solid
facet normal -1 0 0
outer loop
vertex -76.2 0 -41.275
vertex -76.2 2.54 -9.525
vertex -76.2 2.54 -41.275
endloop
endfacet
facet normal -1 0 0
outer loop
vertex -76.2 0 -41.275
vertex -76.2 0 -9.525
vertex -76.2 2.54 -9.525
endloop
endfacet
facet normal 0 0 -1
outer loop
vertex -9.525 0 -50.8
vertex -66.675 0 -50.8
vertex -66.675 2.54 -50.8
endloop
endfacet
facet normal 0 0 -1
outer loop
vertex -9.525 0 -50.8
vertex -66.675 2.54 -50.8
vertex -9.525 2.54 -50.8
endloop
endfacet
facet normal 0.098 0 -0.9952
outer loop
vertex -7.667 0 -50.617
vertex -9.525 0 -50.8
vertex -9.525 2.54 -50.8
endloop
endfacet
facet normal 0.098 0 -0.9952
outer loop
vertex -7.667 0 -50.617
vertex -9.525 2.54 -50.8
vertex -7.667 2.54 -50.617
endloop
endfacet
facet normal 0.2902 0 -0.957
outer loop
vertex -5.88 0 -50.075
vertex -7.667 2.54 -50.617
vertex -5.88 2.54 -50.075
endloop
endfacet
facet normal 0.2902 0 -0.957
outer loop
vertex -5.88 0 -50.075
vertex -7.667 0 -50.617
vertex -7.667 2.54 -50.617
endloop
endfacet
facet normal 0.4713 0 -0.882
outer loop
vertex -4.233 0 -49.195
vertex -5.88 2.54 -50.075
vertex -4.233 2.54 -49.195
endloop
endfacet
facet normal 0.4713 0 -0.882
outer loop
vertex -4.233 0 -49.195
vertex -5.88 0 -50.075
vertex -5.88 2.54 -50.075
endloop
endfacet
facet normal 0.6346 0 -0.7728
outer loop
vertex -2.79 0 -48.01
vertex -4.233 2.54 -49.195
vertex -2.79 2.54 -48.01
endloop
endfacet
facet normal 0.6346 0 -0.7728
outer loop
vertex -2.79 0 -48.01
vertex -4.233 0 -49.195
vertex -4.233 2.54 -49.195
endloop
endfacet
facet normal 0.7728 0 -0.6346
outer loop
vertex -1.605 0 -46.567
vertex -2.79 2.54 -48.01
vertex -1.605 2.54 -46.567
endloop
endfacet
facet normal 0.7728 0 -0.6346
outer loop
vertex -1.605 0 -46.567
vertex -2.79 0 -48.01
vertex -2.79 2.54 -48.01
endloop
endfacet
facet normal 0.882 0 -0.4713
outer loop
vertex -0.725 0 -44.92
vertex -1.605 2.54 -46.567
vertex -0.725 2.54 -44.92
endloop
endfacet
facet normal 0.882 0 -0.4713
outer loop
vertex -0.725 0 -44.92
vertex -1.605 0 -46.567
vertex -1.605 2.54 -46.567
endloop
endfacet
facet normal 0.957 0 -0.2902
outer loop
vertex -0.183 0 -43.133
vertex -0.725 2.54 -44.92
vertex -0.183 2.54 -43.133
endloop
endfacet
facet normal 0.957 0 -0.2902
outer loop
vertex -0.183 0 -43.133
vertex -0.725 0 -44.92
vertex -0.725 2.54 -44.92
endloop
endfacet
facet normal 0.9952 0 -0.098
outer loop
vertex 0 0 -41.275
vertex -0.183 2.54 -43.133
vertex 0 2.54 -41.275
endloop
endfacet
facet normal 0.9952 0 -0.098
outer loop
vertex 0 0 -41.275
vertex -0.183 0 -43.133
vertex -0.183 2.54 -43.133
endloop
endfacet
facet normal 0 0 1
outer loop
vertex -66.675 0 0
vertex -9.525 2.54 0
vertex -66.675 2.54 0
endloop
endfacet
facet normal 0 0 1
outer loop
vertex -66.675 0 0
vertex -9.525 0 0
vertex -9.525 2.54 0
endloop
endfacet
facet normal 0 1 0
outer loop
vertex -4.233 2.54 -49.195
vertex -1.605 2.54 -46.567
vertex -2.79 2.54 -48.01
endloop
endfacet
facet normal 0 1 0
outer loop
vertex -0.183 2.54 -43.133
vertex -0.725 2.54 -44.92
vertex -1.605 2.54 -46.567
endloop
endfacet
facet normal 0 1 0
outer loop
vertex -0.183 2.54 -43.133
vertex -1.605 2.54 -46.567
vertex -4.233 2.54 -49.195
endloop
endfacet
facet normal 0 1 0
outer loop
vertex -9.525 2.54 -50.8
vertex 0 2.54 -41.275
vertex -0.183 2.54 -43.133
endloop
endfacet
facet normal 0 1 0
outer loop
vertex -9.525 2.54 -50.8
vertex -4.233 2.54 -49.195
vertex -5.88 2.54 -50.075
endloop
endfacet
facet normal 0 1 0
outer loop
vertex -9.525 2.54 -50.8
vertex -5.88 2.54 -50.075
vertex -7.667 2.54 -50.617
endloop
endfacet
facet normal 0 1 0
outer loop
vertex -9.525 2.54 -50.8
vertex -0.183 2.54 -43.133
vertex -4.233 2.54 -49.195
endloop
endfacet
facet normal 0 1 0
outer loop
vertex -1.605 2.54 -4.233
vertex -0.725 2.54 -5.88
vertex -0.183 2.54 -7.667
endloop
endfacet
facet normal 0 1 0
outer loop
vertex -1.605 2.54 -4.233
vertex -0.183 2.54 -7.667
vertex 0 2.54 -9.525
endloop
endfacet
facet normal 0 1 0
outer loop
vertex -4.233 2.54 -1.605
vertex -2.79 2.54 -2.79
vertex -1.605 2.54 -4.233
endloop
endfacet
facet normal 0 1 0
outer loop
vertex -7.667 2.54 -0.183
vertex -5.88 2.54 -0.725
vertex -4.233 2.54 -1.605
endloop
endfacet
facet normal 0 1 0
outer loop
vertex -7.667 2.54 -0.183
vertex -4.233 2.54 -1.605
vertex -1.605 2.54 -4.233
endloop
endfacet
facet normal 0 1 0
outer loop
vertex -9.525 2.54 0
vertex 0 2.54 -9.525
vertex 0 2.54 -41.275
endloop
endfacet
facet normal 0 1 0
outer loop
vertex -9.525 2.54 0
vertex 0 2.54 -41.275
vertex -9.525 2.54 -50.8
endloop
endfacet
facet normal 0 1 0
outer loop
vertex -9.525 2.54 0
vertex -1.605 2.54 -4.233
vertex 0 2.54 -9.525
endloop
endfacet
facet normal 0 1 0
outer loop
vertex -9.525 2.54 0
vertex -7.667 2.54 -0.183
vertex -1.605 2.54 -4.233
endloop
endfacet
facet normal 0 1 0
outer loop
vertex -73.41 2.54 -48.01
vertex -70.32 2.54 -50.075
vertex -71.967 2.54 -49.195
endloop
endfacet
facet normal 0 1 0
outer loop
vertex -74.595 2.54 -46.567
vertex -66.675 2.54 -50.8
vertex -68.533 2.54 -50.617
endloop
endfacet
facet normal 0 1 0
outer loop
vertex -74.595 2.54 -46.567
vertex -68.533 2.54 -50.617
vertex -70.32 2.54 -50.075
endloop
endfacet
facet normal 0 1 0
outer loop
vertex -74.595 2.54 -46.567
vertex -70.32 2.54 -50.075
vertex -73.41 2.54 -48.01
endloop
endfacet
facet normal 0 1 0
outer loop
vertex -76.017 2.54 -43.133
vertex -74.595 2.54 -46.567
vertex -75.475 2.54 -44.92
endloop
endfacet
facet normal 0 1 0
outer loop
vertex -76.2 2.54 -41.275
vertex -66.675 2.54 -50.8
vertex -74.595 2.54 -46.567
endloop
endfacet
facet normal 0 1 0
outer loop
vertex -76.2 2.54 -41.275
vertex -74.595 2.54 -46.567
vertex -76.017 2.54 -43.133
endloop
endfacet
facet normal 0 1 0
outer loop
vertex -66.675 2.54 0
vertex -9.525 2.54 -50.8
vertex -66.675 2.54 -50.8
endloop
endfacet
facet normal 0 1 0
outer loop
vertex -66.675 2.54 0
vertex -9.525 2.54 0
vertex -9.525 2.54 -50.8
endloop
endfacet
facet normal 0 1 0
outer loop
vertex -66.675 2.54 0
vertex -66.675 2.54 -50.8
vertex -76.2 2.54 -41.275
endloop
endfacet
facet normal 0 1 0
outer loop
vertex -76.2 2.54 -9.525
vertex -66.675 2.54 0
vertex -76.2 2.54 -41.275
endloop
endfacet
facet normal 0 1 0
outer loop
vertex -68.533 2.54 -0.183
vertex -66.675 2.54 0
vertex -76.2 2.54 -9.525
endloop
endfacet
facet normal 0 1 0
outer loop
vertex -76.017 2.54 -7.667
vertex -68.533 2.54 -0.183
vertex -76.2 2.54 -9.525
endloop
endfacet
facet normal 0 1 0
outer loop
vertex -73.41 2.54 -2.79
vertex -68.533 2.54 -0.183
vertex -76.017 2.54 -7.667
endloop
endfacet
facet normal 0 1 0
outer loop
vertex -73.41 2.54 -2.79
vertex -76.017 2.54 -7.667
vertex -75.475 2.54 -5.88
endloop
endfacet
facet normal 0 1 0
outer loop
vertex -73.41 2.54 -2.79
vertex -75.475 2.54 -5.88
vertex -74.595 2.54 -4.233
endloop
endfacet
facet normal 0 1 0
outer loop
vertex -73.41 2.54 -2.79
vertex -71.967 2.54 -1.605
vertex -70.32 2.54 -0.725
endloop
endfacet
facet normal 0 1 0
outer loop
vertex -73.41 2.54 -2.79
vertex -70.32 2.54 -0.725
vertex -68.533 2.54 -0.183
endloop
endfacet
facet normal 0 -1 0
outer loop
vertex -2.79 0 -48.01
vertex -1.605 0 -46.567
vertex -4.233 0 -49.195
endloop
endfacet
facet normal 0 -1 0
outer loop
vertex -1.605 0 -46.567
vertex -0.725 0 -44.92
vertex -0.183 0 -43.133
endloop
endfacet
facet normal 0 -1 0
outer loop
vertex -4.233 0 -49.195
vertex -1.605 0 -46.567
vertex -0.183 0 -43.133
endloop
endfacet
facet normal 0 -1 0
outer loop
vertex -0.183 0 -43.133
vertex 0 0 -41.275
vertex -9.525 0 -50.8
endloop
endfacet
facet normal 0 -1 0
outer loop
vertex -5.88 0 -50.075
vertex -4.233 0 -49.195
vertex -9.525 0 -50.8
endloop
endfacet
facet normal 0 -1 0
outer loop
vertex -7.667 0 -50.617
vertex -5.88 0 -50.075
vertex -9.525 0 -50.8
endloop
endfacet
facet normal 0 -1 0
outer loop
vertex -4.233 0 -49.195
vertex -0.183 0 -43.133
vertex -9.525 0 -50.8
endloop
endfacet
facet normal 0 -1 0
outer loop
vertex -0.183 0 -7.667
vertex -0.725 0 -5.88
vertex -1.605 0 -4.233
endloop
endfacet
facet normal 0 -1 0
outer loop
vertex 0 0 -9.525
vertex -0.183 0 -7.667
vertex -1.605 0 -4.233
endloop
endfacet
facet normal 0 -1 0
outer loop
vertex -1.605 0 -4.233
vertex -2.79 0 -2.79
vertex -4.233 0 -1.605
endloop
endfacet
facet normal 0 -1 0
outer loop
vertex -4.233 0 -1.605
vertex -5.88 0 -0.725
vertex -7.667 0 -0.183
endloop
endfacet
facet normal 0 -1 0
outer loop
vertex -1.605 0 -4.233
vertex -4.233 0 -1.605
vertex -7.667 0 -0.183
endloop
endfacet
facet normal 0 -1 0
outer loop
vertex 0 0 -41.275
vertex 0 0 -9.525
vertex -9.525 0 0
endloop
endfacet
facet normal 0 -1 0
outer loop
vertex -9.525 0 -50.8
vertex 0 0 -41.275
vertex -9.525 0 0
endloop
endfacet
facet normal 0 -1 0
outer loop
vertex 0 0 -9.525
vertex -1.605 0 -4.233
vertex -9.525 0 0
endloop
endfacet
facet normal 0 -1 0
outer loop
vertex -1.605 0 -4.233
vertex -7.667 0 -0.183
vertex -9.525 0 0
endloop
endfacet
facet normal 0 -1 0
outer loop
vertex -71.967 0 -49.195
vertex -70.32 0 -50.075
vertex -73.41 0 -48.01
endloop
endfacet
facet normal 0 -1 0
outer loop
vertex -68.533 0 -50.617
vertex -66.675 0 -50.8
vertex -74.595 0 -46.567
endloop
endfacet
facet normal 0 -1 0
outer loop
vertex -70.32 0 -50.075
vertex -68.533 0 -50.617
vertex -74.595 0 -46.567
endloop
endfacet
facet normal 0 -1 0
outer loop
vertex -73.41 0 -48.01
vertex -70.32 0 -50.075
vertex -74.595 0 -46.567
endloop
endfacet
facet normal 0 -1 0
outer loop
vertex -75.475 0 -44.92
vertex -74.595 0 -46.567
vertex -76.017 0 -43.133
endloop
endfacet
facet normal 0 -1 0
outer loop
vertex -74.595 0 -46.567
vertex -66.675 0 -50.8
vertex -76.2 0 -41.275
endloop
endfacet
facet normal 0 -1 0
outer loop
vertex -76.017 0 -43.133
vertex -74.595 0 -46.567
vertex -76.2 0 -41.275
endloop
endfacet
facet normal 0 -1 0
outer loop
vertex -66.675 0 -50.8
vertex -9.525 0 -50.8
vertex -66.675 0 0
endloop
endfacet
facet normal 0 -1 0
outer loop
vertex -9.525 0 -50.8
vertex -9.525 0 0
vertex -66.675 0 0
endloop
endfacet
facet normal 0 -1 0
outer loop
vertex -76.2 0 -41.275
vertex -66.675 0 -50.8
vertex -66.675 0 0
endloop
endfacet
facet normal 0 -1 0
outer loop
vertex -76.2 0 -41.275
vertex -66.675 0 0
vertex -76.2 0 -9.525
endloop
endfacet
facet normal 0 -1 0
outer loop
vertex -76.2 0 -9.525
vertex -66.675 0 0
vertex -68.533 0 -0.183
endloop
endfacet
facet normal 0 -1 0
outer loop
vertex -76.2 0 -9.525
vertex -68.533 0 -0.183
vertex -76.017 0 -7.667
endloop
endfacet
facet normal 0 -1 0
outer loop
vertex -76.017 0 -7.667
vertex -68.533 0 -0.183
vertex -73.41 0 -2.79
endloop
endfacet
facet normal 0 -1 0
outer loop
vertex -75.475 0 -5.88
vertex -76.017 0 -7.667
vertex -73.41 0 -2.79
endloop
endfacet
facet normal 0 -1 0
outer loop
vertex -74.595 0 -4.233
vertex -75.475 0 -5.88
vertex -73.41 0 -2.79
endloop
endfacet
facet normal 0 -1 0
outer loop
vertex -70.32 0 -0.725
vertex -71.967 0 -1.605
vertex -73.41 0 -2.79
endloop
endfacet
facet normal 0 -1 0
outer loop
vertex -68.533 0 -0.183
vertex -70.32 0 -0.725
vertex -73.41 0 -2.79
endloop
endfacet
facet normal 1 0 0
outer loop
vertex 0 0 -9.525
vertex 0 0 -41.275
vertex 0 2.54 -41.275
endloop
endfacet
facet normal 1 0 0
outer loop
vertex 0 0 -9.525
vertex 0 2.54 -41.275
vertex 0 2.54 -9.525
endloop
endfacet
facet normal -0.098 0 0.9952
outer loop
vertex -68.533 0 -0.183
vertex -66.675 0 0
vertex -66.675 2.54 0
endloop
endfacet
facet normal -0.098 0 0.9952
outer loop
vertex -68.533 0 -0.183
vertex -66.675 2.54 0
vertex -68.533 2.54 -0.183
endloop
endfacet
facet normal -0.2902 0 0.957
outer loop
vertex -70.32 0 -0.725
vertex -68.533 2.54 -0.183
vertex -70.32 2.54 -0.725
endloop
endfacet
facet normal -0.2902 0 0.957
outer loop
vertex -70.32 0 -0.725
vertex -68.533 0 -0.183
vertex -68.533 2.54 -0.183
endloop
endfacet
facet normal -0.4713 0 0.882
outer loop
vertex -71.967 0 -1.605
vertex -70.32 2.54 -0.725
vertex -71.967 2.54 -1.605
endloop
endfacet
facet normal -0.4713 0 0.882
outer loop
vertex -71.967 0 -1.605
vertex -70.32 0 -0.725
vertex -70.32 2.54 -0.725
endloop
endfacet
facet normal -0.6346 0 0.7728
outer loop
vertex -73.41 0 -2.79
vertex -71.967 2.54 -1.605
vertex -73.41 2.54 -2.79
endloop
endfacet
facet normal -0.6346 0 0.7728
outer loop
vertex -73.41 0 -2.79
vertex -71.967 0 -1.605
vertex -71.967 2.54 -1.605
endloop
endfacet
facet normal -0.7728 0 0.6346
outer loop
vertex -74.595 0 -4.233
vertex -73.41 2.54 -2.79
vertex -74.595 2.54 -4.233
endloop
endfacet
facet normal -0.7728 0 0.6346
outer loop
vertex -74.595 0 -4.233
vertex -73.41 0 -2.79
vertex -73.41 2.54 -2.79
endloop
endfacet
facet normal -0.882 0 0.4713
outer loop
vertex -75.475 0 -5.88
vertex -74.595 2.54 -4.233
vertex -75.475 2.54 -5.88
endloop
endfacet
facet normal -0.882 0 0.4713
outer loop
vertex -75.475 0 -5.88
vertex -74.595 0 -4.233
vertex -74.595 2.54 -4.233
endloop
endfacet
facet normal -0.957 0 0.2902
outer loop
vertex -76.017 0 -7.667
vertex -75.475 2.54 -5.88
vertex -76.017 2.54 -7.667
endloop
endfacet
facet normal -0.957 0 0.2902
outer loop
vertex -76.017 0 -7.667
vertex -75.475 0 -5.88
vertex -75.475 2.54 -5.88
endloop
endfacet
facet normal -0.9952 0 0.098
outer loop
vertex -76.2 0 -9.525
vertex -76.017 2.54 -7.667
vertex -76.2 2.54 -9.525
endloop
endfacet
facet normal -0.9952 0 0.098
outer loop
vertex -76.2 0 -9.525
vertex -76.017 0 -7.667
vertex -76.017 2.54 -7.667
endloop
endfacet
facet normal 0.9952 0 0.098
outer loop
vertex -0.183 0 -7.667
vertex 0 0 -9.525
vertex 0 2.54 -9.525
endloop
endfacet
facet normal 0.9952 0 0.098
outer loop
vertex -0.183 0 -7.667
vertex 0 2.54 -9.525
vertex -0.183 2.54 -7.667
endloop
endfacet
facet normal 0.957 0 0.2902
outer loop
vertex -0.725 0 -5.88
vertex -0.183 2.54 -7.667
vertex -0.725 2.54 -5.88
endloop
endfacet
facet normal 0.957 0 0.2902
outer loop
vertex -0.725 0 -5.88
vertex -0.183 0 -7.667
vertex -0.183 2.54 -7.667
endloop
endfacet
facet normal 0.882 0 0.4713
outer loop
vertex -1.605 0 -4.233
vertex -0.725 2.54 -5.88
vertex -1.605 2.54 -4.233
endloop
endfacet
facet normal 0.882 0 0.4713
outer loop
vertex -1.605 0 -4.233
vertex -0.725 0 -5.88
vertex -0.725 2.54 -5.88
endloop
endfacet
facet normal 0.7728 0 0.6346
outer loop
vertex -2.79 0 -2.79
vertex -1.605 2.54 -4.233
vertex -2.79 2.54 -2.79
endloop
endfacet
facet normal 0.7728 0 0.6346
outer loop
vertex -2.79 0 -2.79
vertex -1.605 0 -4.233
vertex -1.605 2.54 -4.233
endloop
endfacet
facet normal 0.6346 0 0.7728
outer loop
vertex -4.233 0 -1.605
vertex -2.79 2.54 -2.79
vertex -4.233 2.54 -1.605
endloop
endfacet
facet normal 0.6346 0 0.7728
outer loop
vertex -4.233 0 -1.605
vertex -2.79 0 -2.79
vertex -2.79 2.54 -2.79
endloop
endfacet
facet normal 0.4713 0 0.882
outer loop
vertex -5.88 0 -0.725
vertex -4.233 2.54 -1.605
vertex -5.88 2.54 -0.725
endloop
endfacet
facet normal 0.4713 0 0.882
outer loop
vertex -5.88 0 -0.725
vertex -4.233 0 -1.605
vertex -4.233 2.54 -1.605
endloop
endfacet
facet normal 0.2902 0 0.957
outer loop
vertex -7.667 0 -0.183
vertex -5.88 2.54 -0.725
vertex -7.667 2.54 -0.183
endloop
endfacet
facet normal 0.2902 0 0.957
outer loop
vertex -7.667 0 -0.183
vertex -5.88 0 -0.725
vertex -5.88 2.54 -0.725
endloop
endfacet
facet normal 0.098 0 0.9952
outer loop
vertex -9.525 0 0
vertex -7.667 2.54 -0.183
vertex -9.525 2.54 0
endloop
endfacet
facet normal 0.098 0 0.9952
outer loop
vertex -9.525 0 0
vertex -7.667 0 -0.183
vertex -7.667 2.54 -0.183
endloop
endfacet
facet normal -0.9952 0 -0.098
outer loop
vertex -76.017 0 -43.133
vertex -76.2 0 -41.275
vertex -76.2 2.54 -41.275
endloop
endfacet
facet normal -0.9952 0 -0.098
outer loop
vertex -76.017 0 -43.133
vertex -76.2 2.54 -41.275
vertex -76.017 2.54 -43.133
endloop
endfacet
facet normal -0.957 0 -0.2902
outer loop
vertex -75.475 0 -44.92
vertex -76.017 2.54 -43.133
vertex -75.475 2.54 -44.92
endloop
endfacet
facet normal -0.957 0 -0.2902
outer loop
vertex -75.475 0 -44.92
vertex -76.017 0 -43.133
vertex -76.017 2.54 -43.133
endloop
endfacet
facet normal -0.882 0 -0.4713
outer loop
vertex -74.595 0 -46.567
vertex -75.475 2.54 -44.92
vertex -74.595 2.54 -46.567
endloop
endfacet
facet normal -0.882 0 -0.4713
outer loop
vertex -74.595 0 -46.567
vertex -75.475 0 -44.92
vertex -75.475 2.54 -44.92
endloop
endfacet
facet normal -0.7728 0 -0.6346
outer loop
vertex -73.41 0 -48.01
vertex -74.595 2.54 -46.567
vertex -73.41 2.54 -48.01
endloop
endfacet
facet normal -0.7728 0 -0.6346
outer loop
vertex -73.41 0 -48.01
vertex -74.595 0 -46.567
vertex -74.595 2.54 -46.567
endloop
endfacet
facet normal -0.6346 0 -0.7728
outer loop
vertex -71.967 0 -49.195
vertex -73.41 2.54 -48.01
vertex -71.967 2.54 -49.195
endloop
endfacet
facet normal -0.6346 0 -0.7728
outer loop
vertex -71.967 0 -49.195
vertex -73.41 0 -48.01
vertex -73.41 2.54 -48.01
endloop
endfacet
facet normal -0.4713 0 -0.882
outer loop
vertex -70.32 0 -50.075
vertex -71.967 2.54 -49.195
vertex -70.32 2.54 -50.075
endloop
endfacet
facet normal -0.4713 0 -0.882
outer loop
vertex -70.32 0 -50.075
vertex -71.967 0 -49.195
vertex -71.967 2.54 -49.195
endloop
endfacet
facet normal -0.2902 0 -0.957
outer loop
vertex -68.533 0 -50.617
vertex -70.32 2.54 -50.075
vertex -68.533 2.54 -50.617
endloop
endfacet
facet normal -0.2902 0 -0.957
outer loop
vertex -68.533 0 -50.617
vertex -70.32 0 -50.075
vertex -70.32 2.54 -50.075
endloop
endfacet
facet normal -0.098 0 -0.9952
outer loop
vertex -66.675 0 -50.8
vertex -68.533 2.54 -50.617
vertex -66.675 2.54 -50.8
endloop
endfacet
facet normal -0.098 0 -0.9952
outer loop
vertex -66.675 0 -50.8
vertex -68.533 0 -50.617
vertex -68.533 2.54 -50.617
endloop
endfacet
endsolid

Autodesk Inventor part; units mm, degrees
ref_plane "YZ Plane" through (0, 0, 0) normal (1, 0, 0) x (0, 1, 0)
ref_plane "XZ Plane" through (0, 0, 0) normal (0, 1, 0) x (-1, 0, 0)
ref_plane "XY Plane" through (0, 0, 0) normal (0, 0, 1) x (1, 0, 0)
sketch "Sketch1" plane through (0, 0, 0) normal (0, 1, 0) x (-1, 0, 0)
  line L0 (9.525, 0) -> (66.675, 0)
  line L1 (76.2, -9.525) -> (76.2, -41.275)
  line L2 (66.675, -50.8) -> (9.525, -50.8)
  line L3 (0, -41.275) -> (0, -9.525)
  arc A0 (76.2, -9.525) -> (66.675, 0) centre (66.675, -9.525) ccw
  arc A1 (66.675, -50.8) -> (76.2, -41.275) centre (66.675, -41.275) ccw
  arc A2 (0, -41.275) -> (9.525, -50.8) centre (9.525, -41.275) ccw
  arc A3 (9.525, 0) -> (0, -9.525) centre (9.525, -9.525) ccw
  point P0 (0, 0)
  point P1 (76.2, 0)
  point P2 (76.2, -50.8)
  point P3 (0, -50.8)
  dimension "d0" = 50.8
  dimension "d1" = 76.2
  dimension "d2" = 9.525
  dimension "d3" = 9.525
extrude "Extrusion1" add sketch "Sketch1" along normal blind 2.54
properties part number "bottom ecoflex layer" material "PMMA Plastic"
